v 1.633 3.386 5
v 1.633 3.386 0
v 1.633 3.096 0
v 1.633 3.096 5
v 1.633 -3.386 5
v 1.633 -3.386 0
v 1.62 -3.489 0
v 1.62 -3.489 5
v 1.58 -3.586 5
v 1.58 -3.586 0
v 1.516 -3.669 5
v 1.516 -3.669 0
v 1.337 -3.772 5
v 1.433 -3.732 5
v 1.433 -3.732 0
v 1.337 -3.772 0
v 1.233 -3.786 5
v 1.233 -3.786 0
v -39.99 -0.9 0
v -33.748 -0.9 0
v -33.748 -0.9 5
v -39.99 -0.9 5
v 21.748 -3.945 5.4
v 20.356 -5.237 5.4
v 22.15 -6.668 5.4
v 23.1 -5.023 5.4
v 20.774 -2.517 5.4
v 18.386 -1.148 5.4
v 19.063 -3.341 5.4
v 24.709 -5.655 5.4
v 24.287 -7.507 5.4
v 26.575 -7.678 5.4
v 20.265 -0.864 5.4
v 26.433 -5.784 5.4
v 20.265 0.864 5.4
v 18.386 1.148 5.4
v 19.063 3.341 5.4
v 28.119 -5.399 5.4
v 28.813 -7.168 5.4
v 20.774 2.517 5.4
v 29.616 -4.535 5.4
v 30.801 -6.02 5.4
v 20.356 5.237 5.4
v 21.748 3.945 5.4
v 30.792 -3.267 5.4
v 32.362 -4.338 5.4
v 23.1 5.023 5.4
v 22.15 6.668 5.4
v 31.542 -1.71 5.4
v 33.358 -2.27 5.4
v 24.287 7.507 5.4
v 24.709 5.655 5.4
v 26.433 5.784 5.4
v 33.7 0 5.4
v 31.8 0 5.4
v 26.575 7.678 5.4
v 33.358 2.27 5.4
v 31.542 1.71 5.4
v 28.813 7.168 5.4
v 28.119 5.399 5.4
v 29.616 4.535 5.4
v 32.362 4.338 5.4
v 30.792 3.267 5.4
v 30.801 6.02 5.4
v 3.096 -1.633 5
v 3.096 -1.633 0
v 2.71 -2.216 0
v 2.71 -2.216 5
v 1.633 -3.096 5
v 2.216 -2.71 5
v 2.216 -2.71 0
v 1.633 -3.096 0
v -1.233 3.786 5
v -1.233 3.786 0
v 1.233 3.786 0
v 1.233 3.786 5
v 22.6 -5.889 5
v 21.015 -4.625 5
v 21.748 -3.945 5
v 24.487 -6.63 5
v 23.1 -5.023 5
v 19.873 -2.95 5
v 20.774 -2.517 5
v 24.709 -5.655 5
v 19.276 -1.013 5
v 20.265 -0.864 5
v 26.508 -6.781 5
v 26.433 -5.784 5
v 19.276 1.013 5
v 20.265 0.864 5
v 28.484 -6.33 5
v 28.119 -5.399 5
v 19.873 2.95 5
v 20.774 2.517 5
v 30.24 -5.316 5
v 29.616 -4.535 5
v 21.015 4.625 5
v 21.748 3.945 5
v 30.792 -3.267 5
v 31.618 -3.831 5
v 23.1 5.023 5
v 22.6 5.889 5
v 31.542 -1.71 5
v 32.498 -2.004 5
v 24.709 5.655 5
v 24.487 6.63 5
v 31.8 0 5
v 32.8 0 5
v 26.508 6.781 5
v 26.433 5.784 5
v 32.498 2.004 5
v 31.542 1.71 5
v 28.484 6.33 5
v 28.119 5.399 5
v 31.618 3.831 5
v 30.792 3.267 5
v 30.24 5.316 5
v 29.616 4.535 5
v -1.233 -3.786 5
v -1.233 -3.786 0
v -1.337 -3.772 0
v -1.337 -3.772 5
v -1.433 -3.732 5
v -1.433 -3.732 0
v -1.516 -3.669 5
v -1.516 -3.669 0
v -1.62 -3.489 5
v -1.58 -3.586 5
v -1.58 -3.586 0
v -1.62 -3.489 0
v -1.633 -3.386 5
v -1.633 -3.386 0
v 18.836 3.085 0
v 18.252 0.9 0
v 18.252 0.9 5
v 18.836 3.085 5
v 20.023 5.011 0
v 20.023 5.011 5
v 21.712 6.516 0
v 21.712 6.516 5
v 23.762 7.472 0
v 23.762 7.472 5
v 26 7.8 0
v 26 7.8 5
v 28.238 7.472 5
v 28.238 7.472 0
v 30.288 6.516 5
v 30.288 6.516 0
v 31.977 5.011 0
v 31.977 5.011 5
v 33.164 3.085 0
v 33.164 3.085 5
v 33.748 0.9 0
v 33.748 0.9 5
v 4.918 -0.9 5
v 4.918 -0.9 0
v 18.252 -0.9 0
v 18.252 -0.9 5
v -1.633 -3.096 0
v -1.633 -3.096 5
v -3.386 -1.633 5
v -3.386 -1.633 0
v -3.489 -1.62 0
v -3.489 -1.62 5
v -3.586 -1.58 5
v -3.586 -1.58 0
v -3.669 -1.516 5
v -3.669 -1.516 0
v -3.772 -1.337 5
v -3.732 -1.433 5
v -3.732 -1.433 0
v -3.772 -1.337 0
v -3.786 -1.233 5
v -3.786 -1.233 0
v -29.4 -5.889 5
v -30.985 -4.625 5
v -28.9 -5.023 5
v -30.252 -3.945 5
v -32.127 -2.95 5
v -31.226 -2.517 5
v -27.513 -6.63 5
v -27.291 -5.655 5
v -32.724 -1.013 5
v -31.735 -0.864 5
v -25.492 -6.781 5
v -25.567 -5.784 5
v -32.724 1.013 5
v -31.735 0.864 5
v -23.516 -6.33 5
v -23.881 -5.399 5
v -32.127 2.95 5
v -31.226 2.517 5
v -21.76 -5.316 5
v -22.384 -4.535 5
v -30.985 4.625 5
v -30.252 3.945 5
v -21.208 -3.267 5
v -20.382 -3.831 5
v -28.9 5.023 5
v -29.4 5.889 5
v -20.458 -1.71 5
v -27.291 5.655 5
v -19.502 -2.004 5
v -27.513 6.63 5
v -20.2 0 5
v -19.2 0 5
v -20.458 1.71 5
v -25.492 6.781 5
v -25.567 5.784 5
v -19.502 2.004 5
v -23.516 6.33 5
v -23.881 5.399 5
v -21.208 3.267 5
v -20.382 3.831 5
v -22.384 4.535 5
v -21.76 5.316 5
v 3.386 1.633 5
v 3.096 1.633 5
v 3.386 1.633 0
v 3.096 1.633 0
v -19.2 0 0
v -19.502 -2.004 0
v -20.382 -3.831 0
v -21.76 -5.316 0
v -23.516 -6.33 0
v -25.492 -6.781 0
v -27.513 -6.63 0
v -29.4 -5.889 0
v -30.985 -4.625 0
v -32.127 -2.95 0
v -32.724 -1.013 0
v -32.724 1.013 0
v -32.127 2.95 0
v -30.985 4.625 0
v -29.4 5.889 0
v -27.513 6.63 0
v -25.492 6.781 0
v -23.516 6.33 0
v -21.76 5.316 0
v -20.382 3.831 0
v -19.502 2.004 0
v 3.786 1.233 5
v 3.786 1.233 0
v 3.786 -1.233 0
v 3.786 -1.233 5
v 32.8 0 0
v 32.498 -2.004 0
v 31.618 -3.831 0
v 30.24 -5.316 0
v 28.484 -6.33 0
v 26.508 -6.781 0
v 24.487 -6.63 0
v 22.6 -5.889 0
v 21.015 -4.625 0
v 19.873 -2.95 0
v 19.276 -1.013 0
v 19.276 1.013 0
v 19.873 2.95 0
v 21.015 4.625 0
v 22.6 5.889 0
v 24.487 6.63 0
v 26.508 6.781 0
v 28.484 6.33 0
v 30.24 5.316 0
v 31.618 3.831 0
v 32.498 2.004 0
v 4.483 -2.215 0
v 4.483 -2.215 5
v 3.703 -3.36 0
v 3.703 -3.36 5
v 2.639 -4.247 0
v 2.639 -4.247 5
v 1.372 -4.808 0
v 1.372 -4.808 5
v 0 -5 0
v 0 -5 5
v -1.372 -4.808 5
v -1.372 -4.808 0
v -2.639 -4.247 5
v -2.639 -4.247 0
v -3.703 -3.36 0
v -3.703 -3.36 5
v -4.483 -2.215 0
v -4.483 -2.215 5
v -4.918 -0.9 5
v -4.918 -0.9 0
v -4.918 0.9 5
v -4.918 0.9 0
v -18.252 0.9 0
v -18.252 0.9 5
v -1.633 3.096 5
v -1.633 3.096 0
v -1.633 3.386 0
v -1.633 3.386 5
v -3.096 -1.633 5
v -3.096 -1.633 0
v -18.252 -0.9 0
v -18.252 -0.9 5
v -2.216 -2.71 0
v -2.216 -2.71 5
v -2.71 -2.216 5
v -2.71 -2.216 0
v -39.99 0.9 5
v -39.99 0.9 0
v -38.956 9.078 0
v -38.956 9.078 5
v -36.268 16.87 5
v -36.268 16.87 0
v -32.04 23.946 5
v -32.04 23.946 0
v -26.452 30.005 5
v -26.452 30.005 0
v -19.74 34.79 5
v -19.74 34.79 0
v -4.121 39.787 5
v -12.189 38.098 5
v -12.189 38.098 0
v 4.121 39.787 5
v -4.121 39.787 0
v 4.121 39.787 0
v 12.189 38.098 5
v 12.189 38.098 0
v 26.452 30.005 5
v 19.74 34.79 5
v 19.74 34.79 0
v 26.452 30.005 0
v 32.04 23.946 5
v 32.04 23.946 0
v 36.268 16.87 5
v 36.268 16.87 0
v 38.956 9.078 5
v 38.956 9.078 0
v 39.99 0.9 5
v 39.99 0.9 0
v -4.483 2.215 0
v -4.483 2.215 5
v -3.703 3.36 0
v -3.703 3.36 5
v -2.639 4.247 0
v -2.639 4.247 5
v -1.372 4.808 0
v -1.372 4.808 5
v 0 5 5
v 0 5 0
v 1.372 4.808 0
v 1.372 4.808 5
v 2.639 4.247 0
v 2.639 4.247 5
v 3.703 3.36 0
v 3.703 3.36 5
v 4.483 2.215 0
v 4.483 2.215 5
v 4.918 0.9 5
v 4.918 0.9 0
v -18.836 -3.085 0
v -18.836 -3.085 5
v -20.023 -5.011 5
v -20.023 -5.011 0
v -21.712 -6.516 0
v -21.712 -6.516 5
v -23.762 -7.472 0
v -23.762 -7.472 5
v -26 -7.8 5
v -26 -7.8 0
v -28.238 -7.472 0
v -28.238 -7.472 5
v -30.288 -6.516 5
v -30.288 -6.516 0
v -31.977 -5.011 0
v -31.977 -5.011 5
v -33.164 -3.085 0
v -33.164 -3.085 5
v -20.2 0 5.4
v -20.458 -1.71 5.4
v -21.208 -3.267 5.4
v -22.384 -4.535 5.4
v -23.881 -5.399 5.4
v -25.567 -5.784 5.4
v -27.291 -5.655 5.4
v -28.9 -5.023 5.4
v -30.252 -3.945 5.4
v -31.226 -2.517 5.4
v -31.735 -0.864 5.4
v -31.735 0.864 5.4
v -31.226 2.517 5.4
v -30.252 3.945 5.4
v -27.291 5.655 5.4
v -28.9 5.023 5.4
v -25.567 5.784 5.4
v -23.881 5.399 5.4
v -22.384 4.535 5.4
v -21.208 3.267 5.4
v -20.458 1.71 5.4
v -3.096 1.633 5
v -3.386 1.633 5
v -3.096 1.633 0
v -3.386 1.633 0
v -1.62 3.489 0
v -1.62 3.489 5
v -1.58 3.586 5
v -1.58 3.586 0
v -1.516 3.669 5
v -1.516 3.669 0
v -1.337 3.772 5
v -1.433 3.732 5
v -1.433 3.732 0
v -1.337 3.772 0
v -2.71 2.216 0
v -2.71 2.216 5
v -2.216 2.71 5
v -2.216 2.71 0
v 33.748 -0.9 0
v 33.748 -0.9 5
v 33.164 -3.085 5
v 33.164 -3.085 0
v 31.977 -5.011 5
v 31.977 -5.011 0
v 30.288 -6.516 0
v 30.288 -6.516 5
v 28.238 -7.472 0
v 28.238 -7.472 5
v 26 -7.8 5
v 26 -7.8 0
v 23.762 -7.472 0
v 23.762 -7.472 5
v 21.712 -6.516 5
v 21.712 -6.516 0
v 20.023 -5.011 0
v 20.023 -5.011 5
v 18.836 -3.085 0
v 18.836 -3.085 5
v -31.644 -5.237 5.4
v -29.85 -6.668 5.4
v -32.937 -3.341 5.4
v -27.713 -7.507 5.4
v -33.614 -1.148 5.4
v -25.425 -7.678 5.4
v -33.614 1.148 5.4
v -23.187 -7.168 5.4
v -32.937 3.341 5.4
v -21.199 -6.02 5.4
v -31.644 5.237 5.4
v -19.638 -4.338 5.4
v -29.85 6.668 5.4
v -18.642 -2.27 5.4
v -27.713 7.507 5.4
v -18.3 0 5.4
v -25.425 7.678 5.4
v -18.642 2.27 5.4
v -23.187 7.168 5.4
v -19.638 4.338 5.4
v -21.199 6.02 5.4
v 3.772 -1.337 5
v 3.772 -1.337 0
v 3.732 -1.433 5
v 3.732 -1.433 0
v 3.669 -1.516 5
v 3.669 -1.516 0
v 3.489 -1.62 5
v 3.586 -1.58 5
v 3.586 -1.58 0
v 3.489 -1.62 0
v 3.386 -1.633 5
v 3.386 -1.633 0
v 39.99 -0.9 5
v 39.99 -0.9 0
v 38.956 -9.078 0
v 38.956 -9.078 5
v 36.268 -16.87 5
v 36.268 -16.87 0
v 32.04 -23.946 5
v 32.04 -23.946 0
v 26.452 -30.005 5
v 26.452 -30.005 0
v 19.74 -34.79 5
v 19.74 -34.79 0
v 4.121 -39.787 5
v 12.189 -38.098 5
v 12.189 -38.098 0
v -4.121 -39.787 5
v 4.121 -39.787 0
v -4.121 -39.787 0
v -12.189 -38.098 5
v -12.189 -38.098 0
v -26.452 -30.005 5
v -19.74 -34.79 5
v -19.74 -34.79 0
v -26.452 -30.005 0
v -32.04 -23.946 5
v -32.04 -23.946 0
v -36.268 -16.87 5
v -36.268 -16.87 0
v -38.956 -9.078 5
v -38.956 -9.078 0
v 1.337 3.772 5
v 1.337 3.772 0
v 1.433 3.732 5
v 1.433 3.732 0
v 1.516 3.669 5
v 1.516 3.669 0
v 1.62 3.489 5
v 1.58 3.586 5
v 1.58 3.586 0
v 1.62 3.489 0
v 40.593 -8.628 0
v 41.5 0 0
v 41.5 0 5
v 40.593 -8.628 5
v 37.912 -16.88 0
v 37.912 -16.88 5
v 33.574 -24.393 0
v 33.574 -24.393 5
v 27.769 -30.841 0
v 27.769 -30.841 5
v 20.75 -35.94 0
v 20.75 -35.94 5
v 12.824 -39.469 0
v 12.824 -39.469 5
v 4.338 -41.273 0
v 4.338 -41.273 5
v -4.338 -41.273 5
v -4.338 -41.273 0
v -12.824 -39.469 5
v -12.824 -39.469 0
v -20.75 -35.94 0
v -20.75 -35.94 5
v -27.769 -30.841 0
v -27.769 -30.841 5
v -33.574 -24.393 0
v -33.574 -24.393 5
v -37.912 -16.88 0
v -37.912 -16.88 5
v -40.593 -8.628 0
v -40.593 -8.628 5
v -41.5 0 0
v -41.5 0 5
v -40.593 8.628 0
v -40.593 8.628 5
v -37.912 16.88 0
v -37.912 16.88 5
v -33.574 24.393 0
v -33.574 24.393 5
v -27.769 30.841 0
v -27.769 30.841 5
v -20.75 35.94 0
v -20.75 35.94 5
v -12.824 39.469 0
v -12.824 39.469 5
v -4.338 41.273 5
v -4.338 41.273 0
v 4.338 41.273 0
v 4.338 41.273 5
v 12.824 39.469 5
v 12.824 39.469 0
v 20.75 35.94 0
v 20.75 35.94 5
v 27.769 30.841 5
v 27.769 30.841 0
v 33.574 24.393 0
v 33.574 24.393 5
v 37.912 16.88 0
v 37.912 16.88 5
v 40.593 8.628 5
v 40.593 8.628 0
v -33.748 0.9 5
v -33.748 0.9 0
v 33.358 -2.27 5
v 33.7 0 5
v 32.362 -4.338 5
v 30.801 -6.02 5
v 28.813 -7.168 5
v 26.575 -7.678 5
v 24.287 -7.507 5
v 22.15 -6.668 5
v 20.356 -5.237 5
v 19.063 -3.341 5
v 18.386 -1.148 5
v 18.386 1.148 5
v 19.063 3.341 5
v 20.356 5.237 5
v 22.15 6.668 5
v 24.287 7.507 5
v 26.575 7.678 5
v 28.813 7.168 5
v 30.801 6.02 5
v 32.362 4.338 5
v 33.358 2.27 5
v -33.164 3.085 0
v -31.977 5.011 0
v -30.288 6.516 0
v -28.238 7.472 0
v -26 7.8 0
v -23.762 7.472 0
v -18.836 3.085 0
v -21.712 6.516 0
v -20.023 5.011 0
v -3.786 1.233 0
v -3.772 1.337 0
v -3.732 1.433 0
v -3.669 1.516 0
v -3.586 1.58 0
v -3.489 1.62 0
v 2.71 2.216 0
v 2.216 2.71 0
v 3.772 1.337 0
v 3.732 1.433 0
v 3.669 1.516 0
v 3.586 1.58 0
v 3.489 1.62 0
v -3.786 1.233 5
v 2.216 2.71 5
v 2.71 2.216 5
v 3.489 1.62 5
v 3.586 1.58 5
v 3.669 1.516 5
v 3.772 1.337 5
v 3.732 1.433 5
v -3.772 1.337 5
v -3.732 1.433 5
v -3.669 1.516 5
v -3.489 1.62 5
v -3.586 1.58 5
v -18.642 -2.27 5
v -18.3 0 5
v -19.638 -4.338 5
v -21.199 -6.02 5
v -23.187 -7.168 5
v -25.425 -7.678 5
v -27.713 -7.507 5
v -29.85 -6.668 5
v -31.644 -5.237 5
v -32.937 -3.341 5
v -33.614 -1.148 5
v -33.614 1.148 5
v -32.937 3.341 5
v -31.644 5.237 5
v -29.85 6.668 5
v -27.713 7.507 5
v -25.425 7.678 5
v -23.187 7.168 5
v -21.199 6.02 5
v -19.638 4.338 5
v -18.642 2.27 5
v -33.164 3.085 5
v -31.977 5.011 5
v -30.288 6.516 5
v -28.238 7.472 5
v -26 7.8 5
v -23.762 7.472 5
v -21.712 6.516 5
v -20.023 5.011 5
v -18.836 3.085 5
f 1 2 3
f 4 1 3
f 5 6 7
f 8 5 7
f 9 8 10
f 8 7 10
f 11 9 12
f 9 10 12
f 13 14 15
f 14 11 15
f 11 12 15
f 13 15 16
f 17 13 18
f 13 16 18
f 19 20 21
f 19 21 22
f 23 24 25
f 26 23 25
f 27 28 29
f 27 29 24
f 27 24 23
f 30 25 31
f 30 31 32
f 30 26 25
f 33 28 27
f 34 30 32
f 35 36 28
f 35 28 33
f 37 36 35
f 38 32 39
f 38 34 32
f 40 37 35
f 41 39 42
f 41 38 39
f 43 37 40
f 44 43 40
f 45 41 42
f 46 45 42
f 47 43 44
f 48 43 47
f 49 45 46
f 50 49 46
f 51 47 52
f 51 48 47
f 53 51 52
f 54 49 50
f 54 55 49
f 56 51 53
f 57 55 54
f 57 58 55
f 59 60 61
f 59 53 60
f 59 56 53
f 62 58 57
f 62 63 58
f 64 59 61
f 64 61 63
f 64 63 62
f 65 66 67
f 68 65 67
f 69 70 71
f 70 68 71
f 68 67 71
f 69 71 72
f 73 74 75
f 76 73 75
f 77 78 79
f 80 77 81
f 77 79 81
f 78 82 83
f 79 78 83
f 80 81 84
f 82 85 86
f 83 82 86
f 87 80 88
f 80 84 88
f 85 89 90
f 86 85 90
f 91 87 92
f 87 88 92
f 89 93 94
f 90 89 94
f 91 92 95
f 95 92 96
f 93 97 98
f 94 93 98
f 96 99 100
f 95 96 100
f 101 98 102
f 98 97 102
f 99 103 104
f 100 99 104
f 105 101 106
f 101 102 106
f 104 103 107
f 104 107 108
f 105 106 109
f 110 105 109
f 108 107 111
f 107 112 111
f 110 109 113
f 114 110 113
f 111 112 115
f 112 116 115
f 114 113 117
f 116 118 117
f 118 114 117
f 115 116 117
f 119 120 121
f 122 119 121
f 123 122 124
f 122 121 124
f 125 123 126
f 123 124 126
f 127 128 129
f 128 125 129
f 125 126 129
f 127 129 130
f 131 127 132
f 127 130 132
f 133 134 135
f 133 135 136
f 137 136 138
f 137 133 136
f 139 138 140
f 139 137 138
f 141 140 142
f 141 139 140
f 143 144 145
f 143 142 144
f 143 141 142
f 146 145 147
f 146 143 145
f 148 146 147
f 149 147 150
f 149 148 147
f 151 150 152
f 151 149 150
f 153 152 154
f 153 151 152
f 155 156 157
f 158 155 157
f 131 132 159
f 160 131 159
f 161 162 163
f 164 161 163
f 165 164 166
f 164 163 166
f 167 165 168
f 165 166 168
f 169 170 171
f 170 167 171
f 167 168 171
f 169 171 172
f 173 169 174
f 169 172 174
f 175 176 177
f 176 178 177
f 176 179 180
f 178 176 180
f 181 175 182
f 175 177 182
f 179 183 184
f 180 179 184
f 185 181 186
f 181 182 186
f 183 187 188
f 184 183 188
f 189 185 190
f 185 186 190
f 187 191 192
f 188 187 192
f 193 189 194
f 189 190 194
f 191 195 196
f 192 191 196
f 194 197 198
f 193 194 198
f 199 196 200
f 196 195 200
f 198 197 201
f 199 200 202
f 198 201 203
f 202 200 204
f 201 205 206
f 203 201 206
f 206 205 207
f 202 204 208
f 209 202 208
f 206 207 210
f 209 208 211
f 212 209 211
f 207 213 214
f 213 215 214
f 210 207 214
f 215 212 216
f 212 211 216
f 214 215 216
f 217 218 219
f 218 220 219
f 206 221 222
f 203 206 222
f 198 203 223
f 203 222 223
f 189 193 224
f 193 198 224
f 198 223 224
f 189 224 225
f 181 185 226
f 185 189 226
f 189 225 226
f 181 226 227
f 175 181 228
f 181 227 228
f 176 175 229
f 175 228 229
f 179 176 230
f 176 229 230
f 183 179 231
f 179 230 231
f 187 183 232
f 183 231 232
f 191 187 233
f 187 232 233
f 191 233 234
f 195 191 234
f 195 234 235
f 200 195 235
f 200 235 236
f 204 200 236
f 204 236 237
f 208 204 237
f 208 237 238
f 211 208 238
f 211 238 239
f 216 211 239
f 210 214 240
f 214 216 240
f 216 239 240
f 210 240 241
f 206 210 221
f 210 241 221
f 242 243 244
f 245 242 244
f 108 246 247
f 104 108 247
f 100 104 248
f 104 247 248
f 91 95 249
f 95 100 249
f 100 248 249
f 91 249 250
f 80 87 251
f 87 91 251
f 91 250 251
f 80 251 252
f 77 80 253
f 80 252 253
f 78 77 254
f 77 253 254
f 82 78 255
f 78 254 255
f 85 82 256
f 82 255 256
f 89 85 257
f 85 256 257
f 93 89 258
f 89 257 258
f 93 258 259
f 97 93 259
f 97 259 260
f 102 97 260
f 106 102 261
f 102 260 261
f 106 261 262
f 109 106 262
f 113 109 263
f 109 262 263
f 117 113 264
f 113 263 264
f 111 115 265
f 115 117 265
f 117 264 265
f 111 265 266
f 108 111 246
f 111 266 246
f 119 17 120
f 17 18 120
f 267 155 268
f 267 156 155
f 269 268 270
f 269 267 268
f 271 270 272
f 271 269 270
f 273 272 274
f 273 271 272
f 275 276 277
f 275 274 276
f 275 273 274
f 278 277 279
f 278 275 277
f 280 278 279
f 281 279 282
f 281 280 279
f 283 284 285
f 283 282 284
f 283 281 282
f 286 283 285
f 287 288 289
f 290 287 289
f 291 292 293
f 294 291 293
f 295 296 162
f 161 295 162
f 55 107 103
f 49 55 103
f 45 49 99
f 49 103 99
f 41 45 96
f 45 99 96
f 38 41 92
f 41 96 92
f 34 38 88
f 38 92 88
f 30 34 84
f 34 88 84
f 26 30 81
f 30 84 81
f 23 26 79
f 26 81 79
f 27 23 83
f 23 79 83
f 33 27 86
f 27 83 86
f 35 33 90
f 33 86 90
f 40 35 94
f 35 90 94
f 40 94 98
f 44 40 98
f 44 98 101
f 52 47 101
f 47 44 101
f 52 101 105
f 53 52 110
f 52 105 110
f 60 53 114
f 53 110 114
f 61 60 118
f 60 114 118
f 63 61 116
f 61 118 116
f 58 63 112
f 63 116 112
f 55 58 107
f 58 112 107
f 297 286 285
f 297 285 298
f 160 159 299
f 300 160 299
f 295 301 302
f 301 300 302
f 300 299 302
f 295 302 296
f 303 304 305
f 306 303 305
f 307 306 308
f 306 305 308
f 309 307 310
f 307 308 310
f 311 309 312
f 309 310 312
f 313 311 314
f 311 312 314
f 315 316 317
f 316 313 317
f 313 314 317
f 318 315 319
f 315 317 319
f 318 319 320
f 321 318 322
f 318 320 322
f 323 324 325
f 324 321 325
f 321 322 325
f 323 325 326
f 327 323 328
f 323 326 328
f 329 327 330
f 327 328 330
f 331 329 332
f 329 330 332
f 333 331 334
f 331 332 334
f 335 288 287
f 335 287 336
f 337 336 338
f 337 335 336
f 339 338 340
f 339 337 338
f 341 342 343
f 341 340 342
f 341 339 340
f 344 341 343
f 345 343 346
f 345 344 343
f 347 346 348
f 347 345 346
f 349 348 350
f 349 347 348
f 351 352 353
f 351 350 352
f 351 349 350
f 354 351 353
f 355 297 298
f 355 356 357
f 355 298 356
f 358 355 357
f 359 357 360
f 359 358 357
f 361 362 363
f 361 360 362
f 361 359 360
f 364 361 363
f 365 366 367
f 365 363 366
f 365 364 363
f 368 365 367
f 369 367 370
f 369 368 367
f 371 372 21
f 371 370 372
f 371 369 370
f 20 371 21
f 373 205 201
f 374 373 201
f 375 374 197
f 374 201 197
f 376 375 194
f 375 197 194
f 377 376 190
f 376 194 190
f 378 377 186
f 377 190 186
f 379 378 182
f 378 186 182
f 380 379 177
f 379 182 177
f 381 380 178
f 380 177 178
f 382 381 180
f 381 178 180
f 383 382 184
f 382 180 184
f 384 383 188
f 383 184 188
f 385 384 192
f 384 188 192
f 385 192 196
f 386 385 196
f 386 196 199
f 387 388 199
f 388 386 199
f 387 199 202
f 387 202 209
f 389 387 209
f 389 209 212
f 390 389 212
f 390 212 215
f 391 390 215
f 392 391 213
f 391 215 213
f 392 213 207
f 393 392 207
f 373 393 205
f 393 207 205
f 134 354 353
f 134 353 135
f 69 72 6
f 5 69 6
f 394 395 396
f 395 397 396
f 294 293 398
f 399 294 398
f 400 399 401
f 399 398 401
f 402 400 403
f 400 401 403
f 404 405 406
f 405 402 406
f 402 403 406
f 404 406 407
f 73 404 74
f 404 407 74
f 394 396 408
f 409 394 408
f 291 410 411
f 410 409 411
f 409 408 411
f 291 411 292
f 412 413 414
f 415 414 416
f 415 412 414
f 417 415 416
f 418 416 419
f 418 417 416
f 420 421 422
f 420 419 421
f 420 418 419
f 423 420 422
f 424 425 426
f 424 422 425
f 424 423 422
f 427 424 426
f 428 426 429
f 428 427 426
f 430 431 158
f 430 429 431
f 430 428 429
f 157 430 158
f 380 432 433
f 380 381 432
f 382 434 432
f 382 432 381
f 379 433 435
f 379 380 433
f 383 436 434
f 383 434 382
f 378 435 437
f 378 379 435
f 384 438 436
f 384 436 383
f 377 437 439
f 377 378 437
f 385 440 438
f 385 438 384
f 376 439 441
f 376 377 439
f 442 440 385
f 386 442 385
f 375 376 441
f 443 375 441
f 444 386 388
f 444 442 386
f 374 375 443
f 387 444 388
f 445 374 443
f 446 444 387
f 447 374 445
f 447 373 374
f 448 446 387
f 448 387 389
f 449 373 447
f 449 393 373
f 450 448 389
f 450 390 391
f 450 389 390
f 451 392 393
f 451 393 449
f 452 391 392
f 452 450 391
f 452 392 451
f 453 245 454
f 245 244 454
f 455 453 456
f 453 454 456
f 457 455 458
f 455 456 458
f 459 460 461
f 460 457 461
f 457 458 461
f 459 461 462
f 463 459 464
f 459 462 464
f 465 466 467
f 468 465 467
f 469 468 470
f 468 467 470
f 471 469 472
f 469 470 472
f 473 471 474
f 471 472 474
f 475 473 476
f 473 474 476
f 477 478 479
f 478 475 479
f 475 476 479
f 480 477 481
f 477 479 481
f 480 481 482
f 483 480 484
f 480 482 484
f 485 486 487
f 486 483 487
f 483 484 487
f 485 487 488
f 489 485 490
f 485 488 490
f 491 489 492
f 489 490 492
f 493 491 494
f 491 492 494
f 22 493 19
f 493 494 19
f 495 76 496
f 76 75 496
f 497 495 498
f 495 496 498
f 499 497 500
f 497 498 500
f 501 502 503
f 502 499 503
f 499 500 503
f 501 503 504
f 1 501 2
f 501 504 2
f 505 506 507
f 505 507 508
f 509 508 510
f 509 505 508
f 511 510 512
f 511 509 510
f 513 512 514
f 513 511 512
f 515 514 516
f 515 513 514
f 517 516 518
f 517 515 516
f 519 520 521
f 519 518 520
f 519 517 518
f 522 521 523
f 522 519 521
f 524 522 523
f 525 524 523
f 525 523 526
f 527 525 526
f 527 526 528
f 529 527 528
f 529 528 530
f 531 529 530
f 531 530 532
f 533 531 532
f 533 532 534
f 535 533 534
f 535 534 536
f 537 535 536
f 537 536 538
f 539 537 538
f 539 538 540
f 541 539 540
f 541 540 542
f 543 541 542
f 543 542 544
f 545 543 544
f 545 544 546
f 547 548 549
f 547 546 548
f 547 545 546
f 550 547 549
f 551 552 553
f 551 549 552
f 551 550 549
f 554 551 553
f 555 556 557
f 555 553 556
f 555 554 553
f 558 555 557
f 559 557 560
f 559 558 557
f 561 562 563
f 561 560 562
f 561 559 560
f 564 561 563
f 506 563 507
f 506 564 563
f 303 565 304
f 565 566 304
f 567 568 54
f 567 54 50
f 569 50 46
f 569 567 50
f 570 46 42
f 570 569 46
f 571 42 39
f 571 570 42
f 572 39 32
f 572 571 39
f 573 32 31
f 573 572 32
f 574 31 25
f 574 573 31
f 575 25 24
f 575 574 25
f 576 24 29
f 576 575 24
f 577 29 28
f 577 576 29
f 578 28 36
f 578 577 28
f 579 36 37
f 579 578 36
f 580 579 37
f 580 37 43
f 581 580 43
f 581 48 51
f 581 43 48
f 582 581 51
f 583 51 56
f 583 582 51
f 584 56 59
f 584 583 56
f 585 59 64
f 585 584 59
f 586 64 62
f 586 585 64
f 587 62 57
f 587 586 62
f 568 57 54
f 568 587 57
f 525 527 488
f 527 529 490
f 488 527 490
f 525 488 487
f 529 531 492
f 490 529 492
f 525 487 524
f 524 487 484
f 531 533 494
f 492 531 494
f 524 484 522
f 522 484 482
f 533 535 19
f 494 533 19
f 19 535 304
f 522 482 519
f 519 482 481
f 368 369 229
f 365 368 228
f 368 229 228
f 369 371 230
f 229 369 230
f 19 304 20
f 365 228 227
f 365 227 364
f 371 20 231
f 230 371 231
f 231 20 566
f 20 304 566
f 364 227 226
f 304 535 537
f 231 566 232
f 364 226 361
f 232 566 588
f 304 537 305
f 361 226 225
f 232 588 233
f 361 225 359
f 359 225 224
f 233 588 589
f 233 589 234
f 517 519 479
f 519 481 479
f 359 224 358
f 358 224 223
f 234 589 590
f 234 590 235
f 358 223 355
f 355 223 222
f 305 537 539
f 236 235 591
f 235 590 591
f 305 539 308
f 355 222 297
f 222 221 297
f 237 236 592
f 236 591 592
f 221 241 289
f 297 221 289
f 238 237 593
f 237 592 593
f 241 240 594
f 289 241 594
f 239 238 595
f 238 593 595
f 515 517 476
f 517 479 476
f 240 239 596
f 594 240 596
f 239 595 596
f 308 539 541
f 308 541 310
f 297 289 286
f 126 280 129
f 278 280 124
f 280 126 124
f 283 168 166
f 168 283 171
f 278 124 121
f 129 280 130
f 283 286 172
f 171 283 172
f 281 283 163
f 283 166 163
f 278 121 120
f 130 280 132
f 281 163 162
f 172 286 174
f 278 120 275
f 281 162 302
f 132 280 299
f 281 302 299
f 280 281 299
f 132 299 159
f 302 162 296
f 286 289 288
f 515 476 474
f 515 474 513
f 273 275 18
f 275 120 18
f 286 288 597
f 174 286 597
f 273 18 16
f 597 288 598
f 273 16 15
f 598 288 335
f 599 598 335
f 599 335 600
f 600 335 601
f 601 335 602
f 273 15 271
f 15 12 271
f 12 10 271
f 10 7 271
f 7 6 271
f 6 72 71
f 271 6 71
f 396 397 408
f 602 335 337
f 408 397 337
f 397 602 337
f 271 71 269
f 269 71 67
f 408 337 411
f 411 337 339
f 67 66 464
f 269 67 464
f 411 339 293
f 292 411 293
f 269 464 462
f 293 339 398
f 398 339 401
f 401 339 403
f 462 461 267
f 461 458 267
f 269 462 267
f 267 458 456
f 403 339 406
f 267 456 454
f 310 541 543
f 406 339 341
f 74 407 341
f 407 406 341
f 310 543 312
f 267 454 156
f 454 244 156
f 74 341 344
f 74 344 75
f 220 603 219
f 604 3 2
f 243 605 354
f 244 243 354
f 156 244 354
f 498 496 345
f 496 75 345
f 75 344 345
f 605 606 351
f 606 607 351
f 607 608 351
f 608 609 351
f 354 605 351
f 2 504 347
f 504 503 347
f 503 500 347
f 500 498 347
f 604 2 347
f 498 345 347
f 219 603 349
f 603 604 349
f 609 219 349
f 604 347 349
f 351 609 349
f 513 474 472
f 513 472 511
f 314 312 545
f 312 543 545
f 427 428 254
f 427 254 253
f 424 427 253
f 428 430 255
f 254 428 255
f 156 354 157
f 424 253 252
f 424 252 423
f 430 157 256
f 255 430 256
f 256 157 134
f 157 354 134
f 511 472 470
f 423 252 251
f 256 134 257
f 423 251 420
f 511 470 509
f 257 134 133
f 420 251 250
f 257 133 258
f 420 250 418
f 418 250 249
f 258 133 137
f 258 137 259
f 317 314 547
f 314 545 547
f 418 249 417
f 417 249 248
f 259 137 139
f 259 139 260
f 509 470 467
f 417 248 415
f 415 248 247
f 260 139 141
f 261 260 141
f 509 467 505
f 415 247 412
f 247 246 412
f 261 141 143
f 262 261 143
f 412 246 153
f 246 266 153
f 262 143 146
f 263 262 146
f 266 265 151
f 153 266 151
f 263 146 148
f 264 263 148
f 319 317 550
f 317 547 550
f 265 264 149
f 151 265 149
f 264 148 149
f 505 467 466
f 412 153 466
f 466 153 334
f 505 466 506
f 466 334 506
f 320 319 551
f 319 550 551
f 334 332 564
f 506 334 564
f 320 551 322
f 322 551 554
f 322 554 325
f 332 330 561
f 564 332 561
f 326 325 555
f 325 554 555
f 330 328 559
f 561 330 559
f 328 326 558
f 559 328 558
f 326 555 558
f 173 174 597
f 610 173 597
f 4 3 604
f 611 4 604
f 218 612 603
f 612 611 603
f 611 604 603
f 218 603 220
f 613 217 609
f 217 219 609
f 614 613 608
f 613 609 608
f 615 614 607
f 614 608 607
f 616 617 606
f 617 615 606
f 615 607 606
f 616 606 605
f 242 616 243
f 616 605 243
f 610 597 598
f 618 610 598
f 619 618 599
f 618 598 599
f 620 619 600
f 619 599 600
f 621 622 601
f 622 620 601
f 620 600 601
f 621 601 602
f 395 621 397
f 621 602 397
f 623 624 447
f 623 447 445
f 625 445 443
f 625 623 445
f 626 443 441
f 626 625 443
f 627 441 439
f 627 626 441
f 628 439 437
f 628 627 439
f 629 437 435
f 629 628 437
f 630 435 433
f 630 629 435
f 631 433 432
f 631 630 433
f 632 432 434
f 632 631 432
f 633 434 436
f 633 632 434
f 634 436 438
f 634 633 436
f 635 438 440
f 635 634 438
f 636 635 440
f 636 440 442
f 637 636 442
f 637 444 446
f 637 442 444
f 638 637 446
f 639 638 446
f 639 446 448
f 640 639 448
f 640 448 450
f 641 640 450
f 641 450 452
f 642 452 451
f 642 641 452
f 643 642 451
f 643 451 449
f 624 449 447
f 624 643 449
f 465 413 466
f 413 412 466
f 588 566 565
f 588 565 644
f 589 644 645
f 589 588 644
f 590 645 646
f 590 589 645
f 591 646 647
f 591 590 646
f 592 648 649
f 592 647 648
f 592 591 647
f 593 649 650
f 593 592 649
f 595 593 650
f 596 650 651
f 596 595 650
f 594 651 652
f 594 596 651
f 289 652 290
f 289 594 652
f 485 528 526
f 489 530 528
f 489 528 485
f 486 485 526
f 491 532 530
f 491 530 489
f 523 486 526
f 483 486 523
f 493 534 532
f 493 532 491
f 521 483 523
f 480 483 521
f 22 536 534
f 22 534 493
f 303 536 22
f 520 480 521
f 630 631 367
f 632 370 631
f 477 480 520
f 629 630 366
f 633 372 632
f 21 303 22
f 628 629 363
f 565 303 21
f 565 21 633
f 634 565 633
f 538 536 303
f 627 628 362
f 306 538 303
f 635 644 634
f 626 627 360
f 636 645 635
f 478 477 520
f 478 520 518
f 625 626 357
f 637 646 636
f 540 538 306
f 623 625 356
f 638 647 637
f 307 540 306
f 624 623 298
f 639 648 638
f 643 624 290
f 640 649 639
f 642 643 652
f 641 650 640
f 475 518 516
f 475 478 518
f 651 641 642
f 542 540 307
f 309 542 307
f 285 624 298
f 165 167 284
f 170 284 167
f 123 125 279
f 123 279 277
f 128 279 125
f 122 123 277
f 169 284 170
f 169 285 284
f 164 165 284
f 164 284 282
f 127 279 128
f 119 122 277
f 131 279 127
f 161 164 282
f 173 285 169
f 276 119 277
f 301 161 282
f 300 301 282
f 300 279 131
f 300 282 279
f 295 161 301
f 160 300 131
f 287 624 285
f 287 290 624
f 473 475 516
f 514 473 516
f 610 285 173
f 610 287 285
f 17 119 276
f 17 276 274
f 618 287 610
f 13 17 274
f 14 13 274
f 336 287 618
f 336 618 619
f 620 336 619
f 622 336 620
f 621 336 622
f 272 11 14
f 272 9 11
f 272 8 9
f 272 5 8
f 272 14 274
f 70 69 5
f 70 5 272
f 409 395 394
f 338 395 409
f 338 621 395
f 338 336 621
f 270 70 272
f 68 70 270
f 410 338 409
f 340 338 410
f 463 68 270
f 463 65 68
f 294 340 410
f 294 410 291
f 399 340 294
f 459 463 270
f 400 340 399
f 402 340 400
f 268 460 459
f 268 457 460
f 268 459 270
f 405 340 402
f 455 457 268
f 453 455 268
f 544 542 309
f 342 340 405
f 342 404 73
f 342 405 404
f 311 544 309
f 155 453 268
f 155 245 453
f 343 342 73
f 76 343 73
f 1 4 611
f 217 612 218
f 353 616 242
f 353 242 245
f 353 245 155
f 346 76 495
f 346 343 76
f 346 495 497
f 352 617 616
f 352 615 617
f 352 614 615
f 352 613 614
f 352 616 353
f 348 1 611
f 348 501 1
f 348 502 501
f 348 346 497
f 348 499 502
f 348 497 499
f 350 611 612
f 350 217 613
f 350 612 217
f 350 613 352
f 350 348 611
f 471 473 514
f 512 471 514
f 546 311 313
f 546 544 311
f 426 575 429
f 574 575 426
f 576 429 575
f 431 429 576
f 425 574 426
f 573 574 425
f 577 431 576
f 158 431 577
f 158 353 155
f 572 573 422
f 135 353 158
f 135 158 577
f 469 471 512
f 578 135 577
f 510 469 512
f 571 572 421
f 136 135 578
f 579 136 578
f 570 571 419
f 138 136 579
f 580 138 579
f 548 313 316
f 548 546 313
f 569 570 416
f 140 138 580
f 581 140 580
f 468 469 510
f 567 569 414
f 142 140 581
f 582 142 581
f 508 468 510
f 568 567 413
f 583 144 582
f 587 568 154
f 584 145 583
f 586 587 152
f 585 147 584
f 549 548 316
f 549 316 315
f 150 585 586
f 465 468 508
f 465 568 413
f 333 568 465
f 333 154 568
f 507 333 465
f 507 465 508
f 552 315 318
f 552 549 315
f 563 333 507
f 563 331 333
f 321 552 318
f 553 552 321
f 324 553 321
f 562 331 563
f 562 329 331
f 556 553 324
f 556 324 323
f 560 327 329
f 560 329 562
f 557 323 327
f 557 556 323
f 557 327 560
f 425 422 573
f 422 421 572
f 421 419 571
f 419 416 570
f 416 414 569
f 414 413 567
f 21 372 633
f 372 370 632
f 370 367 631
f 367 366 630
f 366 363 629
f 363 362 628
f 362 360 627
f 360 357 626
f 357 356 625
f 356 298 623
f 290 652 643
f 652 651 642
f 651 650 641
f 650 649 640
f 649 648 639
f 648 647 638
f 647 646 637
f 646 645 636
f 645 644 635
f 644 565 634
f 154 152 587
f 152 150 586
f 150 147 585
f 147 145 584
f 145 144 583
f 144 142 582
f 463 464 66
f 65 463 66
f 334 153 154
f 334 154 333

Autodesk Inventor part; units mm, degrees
ref_plane "YZ Plane" through (0, 0, 0) normal (1, 0, 0) x (0, 1, 0)
ref_plane "XZ Plane" through (0, 0, 0) normal (0, 1, 0) x (-1, 0, 0)
ref_plane "XY Plane" through (0, 0, 0) normal (0, 0, 1) x (1, 0, 0)
sketch "Sketch1" plane through (0, 0, 0) normal (0, 0, 1) x (1, 0, 0)
  circle A0 centre (0, 0) radius 40
  circle A1 centre (0, 0) radius 41.5
  circle A2 centre (0, 0) radius 3.5
  circle A3 centre (0, 0) radius 5
  circle A4 centre (26, 0) radius 6.8
  circle A5 centre (26, 0) radius 7.8
  line L0 (0, 0) -> (43.8957, 0) construction
  line L1 (4.9183, 0.9) -> (18.2521, 0.9)
  line L2 (33.7479, 0.9) -> (39.9899, 0.9)
  line L3 (4.9183, -0.9) -> (18.2521, -0.9)
  line L4 (33.7479, -0.9) -> (39.9899, -0.9)
  line L5 (-4.9183, -0.9) -> (-18.2521, -0.9)
  line L6 (-4.9183, 0.9) -> (-18.2521, 0.9)
  circle A6 centre (-26, 0) radius 7.8
  circle A7 centre (-26, 0) radius 6.8
  line L7 (-33.7479, 0.9) -> (-39.9899, 0.9)
  line L8 (-33.7479, -0.9) -> (-39.9899, -0.9)
  line L9 (1.2333, -3.7857) -> (-1.2333, -3.7857)
  line L10 (-1.6333, -3.3857) -> (-1.6333, 3.3857)
  line L11 (-1.2333, 3.7857) -> (1.2333, 3.7857)
  line L12 (1.6333, 3.3857) -> (1.6333, -3.3857)
  line L13 (1.6333, -3.7857) -> (-1.6333, 3.7857) construction
  line L14 (-1.6333, -3.7857) -> (1.6333, 3.7857) construction
  arc A8 (-1.2333, 3.7857) -> (-1.6333, 3.3857) centre (-1.2333, 3.3857) ccw
  arc A9 (1.6333, 3.3857) -> (1.2333, 3.7857) centre (1.2333, 3.3857) ccw
  arc A10 (1.2333, -3.7857) -> (1.6333, -3.3857) centre (1.2333, -3.3857) ccw
  arc A11 (-1.6333, -3.3857) -> (-1.2333, -3.7857) centre (-1.2333, -3.3857) ccw
  line L15 (3.3857, -1.6333) -> (-3.3857, -1.6333)
  line L16 (-3.7857, -1.2333) -> (-3.7857, 1.2333)
  line L17 (-3.3857, 1.6333) -> (3.3857, 1.6333)
  line L18 (3.7857, 1.2333) -> (3.7857, -1.2333)
  line L19 (3.7857, -1.6333) -> (-3.7857, 1.6333) construction
  line L20 (-3.7857, -1.6333) -> (3.7857, 1.6333) construction
  arc A12 (-3.3857, 1.6333) -> (-3.7857, 1.2333) centre (-3.3857, 1.2333) ccw
  arc A13 (3.7857, 1.2333) -> (3.3857, 1.6333) centre (3.3857, 1.2333) ccw
  arc A14 (3.3857, -1.6333) -> (3.7857, -1.2333) centre (3.3857, -1.2333) ccw
  arc A15 (-3.7857, -1.2333) -> (-3.3857, -1.6333) centre (-3.3857, -1.2333) ccw
  point P0 (-4.9183, -0.9)
  point P1 (4.9183, -0.9)
  point P2 (-1.6333, -3.0955)
  point P3 (-1.6333, 3.0955)
  point P4 (1.6333, 3.0955)
  point P5 (1.6333, -3.0955)
  point P6 (-4.9183, 0.9)
  point P7 (-33.7479, 0.9)
  point P8 (-3.0955, -1.6333)
  point P9 (-3.0955, 1.6333)
  point P10 (3.0955, 1.6333)
  point P11 (3.0955, -1.6333)
  dimension "d0" = 80
  dimension "d3" = 10
  dimension "d1" = 83
  dimension "d2" = 7
  dimension "d4" = 13.6
  dimension "d5" = 26
  dimension "d6" = 15.6
  dimension "d10" = 0.9
  dimension "d11" = 0.9
  dimension "d14" = 360
  dimension "d16" = 7.5714
  dimension "d17" = 3.2667
  dimension "d18" = 0.4
  dimension "d29" = 7.5714
  dimension "d30" = 3.2667
  dimension "d31" = 0.4
extrude "Extrusion1" add sketch "Sketch1" along normal blind 5 contours A0 L4 A5 L2 | L7 A6 L8 A0 | A5 | A6 | A5 L3 A3 L1 | L6 A3 L5 A6 | A3 | A1
sketch "Sketch2" plane through (0, 0, 5) normal (0, 0, 1) x (1, 0, 0)
  arc A0 (33.7479, 0.9) -> (18.2521, 0.9) centre (26, 0) ccw projected
  circle A1 centre (26, 0) radius 7.7
  circle A2 centre (26, 0) radius 5.8
  arc A3 (18.2521, -0.9) -> (33.7479, -0.9) centre (26, 0) ccw projected
  circle A4 centre (-26, 0) radius 5.8
  circle A5 centre (-26, 0) radius 7.7
  point P0 (0, 0)
  point P1 (18.3528, 0.9)
  point P2 (33.6472, 0.9)
  point P3 (-18.2521, 0.9)
  point P4 (-33.7479, 0.9)
  point P5 (18.7723, -2.9327)
  dimension "d21" = 7.8
  dimension "d22" = 11.6
  dimension "d27" = 360
extrude "Extrusion2" add sketch "Sketch2" along normal blind 0.4
equation "\"d0\" = D_yttreRing_i"
equation "\"d3\" = D_axel + d_axelRing"
equation "\"d1\" = D_yttreRing_i + d_yttreRing"
equation "\"d2\" = D_axel"
equation "\"d4\" = D_magnet + d_toleransRing"
equation "\"d5\" = l_magnetHållarRingFrånOrigo"
equation "\"d6\" = d_toleransRing + D_magnet + d_magnetHållarRing"
equation "\"d10\" = 0.5 * d_stöttor"
equation "\"d11\" = 0.5 * d_stöttor"
equation "\"d18\" = r_filletAxel"
equation "\"d31\" = r_filletAxel"
equation "\"d19\" = h_höjdMagnetRotor"
equation "\"d22\" = D_magnet - d_magnetSkydd"
equation "\"d23\" = h_magnetSkydd"
equation "\"D_yttreRing_i\" = 80"
equation "\"d_yttreRing\" = 3"
equation "\"D_magnet\" = 13"
equation "\"D_axel\" = 7"
equation "\"d_axelRing\" = 3"
equation "\"h_höjdMagnetRotor\" = 5"
equation "\"d_stöttor\" = 1.8"
equation "\"d_toleransRing\" = 0.6"
equation "\"d_magnetHållarRing\" = 2"
equation "\"l_magnetHållarRingFrånOrigo\" = 26"
equation "\"r_filletAxel\" = 0.4"
equation "\"h_magnetSkydd\" = 0.4"
equation "\"d_magnetSkydd\" = 1.4"
properties part number "Magnet_rotor_parametriserad_02"
